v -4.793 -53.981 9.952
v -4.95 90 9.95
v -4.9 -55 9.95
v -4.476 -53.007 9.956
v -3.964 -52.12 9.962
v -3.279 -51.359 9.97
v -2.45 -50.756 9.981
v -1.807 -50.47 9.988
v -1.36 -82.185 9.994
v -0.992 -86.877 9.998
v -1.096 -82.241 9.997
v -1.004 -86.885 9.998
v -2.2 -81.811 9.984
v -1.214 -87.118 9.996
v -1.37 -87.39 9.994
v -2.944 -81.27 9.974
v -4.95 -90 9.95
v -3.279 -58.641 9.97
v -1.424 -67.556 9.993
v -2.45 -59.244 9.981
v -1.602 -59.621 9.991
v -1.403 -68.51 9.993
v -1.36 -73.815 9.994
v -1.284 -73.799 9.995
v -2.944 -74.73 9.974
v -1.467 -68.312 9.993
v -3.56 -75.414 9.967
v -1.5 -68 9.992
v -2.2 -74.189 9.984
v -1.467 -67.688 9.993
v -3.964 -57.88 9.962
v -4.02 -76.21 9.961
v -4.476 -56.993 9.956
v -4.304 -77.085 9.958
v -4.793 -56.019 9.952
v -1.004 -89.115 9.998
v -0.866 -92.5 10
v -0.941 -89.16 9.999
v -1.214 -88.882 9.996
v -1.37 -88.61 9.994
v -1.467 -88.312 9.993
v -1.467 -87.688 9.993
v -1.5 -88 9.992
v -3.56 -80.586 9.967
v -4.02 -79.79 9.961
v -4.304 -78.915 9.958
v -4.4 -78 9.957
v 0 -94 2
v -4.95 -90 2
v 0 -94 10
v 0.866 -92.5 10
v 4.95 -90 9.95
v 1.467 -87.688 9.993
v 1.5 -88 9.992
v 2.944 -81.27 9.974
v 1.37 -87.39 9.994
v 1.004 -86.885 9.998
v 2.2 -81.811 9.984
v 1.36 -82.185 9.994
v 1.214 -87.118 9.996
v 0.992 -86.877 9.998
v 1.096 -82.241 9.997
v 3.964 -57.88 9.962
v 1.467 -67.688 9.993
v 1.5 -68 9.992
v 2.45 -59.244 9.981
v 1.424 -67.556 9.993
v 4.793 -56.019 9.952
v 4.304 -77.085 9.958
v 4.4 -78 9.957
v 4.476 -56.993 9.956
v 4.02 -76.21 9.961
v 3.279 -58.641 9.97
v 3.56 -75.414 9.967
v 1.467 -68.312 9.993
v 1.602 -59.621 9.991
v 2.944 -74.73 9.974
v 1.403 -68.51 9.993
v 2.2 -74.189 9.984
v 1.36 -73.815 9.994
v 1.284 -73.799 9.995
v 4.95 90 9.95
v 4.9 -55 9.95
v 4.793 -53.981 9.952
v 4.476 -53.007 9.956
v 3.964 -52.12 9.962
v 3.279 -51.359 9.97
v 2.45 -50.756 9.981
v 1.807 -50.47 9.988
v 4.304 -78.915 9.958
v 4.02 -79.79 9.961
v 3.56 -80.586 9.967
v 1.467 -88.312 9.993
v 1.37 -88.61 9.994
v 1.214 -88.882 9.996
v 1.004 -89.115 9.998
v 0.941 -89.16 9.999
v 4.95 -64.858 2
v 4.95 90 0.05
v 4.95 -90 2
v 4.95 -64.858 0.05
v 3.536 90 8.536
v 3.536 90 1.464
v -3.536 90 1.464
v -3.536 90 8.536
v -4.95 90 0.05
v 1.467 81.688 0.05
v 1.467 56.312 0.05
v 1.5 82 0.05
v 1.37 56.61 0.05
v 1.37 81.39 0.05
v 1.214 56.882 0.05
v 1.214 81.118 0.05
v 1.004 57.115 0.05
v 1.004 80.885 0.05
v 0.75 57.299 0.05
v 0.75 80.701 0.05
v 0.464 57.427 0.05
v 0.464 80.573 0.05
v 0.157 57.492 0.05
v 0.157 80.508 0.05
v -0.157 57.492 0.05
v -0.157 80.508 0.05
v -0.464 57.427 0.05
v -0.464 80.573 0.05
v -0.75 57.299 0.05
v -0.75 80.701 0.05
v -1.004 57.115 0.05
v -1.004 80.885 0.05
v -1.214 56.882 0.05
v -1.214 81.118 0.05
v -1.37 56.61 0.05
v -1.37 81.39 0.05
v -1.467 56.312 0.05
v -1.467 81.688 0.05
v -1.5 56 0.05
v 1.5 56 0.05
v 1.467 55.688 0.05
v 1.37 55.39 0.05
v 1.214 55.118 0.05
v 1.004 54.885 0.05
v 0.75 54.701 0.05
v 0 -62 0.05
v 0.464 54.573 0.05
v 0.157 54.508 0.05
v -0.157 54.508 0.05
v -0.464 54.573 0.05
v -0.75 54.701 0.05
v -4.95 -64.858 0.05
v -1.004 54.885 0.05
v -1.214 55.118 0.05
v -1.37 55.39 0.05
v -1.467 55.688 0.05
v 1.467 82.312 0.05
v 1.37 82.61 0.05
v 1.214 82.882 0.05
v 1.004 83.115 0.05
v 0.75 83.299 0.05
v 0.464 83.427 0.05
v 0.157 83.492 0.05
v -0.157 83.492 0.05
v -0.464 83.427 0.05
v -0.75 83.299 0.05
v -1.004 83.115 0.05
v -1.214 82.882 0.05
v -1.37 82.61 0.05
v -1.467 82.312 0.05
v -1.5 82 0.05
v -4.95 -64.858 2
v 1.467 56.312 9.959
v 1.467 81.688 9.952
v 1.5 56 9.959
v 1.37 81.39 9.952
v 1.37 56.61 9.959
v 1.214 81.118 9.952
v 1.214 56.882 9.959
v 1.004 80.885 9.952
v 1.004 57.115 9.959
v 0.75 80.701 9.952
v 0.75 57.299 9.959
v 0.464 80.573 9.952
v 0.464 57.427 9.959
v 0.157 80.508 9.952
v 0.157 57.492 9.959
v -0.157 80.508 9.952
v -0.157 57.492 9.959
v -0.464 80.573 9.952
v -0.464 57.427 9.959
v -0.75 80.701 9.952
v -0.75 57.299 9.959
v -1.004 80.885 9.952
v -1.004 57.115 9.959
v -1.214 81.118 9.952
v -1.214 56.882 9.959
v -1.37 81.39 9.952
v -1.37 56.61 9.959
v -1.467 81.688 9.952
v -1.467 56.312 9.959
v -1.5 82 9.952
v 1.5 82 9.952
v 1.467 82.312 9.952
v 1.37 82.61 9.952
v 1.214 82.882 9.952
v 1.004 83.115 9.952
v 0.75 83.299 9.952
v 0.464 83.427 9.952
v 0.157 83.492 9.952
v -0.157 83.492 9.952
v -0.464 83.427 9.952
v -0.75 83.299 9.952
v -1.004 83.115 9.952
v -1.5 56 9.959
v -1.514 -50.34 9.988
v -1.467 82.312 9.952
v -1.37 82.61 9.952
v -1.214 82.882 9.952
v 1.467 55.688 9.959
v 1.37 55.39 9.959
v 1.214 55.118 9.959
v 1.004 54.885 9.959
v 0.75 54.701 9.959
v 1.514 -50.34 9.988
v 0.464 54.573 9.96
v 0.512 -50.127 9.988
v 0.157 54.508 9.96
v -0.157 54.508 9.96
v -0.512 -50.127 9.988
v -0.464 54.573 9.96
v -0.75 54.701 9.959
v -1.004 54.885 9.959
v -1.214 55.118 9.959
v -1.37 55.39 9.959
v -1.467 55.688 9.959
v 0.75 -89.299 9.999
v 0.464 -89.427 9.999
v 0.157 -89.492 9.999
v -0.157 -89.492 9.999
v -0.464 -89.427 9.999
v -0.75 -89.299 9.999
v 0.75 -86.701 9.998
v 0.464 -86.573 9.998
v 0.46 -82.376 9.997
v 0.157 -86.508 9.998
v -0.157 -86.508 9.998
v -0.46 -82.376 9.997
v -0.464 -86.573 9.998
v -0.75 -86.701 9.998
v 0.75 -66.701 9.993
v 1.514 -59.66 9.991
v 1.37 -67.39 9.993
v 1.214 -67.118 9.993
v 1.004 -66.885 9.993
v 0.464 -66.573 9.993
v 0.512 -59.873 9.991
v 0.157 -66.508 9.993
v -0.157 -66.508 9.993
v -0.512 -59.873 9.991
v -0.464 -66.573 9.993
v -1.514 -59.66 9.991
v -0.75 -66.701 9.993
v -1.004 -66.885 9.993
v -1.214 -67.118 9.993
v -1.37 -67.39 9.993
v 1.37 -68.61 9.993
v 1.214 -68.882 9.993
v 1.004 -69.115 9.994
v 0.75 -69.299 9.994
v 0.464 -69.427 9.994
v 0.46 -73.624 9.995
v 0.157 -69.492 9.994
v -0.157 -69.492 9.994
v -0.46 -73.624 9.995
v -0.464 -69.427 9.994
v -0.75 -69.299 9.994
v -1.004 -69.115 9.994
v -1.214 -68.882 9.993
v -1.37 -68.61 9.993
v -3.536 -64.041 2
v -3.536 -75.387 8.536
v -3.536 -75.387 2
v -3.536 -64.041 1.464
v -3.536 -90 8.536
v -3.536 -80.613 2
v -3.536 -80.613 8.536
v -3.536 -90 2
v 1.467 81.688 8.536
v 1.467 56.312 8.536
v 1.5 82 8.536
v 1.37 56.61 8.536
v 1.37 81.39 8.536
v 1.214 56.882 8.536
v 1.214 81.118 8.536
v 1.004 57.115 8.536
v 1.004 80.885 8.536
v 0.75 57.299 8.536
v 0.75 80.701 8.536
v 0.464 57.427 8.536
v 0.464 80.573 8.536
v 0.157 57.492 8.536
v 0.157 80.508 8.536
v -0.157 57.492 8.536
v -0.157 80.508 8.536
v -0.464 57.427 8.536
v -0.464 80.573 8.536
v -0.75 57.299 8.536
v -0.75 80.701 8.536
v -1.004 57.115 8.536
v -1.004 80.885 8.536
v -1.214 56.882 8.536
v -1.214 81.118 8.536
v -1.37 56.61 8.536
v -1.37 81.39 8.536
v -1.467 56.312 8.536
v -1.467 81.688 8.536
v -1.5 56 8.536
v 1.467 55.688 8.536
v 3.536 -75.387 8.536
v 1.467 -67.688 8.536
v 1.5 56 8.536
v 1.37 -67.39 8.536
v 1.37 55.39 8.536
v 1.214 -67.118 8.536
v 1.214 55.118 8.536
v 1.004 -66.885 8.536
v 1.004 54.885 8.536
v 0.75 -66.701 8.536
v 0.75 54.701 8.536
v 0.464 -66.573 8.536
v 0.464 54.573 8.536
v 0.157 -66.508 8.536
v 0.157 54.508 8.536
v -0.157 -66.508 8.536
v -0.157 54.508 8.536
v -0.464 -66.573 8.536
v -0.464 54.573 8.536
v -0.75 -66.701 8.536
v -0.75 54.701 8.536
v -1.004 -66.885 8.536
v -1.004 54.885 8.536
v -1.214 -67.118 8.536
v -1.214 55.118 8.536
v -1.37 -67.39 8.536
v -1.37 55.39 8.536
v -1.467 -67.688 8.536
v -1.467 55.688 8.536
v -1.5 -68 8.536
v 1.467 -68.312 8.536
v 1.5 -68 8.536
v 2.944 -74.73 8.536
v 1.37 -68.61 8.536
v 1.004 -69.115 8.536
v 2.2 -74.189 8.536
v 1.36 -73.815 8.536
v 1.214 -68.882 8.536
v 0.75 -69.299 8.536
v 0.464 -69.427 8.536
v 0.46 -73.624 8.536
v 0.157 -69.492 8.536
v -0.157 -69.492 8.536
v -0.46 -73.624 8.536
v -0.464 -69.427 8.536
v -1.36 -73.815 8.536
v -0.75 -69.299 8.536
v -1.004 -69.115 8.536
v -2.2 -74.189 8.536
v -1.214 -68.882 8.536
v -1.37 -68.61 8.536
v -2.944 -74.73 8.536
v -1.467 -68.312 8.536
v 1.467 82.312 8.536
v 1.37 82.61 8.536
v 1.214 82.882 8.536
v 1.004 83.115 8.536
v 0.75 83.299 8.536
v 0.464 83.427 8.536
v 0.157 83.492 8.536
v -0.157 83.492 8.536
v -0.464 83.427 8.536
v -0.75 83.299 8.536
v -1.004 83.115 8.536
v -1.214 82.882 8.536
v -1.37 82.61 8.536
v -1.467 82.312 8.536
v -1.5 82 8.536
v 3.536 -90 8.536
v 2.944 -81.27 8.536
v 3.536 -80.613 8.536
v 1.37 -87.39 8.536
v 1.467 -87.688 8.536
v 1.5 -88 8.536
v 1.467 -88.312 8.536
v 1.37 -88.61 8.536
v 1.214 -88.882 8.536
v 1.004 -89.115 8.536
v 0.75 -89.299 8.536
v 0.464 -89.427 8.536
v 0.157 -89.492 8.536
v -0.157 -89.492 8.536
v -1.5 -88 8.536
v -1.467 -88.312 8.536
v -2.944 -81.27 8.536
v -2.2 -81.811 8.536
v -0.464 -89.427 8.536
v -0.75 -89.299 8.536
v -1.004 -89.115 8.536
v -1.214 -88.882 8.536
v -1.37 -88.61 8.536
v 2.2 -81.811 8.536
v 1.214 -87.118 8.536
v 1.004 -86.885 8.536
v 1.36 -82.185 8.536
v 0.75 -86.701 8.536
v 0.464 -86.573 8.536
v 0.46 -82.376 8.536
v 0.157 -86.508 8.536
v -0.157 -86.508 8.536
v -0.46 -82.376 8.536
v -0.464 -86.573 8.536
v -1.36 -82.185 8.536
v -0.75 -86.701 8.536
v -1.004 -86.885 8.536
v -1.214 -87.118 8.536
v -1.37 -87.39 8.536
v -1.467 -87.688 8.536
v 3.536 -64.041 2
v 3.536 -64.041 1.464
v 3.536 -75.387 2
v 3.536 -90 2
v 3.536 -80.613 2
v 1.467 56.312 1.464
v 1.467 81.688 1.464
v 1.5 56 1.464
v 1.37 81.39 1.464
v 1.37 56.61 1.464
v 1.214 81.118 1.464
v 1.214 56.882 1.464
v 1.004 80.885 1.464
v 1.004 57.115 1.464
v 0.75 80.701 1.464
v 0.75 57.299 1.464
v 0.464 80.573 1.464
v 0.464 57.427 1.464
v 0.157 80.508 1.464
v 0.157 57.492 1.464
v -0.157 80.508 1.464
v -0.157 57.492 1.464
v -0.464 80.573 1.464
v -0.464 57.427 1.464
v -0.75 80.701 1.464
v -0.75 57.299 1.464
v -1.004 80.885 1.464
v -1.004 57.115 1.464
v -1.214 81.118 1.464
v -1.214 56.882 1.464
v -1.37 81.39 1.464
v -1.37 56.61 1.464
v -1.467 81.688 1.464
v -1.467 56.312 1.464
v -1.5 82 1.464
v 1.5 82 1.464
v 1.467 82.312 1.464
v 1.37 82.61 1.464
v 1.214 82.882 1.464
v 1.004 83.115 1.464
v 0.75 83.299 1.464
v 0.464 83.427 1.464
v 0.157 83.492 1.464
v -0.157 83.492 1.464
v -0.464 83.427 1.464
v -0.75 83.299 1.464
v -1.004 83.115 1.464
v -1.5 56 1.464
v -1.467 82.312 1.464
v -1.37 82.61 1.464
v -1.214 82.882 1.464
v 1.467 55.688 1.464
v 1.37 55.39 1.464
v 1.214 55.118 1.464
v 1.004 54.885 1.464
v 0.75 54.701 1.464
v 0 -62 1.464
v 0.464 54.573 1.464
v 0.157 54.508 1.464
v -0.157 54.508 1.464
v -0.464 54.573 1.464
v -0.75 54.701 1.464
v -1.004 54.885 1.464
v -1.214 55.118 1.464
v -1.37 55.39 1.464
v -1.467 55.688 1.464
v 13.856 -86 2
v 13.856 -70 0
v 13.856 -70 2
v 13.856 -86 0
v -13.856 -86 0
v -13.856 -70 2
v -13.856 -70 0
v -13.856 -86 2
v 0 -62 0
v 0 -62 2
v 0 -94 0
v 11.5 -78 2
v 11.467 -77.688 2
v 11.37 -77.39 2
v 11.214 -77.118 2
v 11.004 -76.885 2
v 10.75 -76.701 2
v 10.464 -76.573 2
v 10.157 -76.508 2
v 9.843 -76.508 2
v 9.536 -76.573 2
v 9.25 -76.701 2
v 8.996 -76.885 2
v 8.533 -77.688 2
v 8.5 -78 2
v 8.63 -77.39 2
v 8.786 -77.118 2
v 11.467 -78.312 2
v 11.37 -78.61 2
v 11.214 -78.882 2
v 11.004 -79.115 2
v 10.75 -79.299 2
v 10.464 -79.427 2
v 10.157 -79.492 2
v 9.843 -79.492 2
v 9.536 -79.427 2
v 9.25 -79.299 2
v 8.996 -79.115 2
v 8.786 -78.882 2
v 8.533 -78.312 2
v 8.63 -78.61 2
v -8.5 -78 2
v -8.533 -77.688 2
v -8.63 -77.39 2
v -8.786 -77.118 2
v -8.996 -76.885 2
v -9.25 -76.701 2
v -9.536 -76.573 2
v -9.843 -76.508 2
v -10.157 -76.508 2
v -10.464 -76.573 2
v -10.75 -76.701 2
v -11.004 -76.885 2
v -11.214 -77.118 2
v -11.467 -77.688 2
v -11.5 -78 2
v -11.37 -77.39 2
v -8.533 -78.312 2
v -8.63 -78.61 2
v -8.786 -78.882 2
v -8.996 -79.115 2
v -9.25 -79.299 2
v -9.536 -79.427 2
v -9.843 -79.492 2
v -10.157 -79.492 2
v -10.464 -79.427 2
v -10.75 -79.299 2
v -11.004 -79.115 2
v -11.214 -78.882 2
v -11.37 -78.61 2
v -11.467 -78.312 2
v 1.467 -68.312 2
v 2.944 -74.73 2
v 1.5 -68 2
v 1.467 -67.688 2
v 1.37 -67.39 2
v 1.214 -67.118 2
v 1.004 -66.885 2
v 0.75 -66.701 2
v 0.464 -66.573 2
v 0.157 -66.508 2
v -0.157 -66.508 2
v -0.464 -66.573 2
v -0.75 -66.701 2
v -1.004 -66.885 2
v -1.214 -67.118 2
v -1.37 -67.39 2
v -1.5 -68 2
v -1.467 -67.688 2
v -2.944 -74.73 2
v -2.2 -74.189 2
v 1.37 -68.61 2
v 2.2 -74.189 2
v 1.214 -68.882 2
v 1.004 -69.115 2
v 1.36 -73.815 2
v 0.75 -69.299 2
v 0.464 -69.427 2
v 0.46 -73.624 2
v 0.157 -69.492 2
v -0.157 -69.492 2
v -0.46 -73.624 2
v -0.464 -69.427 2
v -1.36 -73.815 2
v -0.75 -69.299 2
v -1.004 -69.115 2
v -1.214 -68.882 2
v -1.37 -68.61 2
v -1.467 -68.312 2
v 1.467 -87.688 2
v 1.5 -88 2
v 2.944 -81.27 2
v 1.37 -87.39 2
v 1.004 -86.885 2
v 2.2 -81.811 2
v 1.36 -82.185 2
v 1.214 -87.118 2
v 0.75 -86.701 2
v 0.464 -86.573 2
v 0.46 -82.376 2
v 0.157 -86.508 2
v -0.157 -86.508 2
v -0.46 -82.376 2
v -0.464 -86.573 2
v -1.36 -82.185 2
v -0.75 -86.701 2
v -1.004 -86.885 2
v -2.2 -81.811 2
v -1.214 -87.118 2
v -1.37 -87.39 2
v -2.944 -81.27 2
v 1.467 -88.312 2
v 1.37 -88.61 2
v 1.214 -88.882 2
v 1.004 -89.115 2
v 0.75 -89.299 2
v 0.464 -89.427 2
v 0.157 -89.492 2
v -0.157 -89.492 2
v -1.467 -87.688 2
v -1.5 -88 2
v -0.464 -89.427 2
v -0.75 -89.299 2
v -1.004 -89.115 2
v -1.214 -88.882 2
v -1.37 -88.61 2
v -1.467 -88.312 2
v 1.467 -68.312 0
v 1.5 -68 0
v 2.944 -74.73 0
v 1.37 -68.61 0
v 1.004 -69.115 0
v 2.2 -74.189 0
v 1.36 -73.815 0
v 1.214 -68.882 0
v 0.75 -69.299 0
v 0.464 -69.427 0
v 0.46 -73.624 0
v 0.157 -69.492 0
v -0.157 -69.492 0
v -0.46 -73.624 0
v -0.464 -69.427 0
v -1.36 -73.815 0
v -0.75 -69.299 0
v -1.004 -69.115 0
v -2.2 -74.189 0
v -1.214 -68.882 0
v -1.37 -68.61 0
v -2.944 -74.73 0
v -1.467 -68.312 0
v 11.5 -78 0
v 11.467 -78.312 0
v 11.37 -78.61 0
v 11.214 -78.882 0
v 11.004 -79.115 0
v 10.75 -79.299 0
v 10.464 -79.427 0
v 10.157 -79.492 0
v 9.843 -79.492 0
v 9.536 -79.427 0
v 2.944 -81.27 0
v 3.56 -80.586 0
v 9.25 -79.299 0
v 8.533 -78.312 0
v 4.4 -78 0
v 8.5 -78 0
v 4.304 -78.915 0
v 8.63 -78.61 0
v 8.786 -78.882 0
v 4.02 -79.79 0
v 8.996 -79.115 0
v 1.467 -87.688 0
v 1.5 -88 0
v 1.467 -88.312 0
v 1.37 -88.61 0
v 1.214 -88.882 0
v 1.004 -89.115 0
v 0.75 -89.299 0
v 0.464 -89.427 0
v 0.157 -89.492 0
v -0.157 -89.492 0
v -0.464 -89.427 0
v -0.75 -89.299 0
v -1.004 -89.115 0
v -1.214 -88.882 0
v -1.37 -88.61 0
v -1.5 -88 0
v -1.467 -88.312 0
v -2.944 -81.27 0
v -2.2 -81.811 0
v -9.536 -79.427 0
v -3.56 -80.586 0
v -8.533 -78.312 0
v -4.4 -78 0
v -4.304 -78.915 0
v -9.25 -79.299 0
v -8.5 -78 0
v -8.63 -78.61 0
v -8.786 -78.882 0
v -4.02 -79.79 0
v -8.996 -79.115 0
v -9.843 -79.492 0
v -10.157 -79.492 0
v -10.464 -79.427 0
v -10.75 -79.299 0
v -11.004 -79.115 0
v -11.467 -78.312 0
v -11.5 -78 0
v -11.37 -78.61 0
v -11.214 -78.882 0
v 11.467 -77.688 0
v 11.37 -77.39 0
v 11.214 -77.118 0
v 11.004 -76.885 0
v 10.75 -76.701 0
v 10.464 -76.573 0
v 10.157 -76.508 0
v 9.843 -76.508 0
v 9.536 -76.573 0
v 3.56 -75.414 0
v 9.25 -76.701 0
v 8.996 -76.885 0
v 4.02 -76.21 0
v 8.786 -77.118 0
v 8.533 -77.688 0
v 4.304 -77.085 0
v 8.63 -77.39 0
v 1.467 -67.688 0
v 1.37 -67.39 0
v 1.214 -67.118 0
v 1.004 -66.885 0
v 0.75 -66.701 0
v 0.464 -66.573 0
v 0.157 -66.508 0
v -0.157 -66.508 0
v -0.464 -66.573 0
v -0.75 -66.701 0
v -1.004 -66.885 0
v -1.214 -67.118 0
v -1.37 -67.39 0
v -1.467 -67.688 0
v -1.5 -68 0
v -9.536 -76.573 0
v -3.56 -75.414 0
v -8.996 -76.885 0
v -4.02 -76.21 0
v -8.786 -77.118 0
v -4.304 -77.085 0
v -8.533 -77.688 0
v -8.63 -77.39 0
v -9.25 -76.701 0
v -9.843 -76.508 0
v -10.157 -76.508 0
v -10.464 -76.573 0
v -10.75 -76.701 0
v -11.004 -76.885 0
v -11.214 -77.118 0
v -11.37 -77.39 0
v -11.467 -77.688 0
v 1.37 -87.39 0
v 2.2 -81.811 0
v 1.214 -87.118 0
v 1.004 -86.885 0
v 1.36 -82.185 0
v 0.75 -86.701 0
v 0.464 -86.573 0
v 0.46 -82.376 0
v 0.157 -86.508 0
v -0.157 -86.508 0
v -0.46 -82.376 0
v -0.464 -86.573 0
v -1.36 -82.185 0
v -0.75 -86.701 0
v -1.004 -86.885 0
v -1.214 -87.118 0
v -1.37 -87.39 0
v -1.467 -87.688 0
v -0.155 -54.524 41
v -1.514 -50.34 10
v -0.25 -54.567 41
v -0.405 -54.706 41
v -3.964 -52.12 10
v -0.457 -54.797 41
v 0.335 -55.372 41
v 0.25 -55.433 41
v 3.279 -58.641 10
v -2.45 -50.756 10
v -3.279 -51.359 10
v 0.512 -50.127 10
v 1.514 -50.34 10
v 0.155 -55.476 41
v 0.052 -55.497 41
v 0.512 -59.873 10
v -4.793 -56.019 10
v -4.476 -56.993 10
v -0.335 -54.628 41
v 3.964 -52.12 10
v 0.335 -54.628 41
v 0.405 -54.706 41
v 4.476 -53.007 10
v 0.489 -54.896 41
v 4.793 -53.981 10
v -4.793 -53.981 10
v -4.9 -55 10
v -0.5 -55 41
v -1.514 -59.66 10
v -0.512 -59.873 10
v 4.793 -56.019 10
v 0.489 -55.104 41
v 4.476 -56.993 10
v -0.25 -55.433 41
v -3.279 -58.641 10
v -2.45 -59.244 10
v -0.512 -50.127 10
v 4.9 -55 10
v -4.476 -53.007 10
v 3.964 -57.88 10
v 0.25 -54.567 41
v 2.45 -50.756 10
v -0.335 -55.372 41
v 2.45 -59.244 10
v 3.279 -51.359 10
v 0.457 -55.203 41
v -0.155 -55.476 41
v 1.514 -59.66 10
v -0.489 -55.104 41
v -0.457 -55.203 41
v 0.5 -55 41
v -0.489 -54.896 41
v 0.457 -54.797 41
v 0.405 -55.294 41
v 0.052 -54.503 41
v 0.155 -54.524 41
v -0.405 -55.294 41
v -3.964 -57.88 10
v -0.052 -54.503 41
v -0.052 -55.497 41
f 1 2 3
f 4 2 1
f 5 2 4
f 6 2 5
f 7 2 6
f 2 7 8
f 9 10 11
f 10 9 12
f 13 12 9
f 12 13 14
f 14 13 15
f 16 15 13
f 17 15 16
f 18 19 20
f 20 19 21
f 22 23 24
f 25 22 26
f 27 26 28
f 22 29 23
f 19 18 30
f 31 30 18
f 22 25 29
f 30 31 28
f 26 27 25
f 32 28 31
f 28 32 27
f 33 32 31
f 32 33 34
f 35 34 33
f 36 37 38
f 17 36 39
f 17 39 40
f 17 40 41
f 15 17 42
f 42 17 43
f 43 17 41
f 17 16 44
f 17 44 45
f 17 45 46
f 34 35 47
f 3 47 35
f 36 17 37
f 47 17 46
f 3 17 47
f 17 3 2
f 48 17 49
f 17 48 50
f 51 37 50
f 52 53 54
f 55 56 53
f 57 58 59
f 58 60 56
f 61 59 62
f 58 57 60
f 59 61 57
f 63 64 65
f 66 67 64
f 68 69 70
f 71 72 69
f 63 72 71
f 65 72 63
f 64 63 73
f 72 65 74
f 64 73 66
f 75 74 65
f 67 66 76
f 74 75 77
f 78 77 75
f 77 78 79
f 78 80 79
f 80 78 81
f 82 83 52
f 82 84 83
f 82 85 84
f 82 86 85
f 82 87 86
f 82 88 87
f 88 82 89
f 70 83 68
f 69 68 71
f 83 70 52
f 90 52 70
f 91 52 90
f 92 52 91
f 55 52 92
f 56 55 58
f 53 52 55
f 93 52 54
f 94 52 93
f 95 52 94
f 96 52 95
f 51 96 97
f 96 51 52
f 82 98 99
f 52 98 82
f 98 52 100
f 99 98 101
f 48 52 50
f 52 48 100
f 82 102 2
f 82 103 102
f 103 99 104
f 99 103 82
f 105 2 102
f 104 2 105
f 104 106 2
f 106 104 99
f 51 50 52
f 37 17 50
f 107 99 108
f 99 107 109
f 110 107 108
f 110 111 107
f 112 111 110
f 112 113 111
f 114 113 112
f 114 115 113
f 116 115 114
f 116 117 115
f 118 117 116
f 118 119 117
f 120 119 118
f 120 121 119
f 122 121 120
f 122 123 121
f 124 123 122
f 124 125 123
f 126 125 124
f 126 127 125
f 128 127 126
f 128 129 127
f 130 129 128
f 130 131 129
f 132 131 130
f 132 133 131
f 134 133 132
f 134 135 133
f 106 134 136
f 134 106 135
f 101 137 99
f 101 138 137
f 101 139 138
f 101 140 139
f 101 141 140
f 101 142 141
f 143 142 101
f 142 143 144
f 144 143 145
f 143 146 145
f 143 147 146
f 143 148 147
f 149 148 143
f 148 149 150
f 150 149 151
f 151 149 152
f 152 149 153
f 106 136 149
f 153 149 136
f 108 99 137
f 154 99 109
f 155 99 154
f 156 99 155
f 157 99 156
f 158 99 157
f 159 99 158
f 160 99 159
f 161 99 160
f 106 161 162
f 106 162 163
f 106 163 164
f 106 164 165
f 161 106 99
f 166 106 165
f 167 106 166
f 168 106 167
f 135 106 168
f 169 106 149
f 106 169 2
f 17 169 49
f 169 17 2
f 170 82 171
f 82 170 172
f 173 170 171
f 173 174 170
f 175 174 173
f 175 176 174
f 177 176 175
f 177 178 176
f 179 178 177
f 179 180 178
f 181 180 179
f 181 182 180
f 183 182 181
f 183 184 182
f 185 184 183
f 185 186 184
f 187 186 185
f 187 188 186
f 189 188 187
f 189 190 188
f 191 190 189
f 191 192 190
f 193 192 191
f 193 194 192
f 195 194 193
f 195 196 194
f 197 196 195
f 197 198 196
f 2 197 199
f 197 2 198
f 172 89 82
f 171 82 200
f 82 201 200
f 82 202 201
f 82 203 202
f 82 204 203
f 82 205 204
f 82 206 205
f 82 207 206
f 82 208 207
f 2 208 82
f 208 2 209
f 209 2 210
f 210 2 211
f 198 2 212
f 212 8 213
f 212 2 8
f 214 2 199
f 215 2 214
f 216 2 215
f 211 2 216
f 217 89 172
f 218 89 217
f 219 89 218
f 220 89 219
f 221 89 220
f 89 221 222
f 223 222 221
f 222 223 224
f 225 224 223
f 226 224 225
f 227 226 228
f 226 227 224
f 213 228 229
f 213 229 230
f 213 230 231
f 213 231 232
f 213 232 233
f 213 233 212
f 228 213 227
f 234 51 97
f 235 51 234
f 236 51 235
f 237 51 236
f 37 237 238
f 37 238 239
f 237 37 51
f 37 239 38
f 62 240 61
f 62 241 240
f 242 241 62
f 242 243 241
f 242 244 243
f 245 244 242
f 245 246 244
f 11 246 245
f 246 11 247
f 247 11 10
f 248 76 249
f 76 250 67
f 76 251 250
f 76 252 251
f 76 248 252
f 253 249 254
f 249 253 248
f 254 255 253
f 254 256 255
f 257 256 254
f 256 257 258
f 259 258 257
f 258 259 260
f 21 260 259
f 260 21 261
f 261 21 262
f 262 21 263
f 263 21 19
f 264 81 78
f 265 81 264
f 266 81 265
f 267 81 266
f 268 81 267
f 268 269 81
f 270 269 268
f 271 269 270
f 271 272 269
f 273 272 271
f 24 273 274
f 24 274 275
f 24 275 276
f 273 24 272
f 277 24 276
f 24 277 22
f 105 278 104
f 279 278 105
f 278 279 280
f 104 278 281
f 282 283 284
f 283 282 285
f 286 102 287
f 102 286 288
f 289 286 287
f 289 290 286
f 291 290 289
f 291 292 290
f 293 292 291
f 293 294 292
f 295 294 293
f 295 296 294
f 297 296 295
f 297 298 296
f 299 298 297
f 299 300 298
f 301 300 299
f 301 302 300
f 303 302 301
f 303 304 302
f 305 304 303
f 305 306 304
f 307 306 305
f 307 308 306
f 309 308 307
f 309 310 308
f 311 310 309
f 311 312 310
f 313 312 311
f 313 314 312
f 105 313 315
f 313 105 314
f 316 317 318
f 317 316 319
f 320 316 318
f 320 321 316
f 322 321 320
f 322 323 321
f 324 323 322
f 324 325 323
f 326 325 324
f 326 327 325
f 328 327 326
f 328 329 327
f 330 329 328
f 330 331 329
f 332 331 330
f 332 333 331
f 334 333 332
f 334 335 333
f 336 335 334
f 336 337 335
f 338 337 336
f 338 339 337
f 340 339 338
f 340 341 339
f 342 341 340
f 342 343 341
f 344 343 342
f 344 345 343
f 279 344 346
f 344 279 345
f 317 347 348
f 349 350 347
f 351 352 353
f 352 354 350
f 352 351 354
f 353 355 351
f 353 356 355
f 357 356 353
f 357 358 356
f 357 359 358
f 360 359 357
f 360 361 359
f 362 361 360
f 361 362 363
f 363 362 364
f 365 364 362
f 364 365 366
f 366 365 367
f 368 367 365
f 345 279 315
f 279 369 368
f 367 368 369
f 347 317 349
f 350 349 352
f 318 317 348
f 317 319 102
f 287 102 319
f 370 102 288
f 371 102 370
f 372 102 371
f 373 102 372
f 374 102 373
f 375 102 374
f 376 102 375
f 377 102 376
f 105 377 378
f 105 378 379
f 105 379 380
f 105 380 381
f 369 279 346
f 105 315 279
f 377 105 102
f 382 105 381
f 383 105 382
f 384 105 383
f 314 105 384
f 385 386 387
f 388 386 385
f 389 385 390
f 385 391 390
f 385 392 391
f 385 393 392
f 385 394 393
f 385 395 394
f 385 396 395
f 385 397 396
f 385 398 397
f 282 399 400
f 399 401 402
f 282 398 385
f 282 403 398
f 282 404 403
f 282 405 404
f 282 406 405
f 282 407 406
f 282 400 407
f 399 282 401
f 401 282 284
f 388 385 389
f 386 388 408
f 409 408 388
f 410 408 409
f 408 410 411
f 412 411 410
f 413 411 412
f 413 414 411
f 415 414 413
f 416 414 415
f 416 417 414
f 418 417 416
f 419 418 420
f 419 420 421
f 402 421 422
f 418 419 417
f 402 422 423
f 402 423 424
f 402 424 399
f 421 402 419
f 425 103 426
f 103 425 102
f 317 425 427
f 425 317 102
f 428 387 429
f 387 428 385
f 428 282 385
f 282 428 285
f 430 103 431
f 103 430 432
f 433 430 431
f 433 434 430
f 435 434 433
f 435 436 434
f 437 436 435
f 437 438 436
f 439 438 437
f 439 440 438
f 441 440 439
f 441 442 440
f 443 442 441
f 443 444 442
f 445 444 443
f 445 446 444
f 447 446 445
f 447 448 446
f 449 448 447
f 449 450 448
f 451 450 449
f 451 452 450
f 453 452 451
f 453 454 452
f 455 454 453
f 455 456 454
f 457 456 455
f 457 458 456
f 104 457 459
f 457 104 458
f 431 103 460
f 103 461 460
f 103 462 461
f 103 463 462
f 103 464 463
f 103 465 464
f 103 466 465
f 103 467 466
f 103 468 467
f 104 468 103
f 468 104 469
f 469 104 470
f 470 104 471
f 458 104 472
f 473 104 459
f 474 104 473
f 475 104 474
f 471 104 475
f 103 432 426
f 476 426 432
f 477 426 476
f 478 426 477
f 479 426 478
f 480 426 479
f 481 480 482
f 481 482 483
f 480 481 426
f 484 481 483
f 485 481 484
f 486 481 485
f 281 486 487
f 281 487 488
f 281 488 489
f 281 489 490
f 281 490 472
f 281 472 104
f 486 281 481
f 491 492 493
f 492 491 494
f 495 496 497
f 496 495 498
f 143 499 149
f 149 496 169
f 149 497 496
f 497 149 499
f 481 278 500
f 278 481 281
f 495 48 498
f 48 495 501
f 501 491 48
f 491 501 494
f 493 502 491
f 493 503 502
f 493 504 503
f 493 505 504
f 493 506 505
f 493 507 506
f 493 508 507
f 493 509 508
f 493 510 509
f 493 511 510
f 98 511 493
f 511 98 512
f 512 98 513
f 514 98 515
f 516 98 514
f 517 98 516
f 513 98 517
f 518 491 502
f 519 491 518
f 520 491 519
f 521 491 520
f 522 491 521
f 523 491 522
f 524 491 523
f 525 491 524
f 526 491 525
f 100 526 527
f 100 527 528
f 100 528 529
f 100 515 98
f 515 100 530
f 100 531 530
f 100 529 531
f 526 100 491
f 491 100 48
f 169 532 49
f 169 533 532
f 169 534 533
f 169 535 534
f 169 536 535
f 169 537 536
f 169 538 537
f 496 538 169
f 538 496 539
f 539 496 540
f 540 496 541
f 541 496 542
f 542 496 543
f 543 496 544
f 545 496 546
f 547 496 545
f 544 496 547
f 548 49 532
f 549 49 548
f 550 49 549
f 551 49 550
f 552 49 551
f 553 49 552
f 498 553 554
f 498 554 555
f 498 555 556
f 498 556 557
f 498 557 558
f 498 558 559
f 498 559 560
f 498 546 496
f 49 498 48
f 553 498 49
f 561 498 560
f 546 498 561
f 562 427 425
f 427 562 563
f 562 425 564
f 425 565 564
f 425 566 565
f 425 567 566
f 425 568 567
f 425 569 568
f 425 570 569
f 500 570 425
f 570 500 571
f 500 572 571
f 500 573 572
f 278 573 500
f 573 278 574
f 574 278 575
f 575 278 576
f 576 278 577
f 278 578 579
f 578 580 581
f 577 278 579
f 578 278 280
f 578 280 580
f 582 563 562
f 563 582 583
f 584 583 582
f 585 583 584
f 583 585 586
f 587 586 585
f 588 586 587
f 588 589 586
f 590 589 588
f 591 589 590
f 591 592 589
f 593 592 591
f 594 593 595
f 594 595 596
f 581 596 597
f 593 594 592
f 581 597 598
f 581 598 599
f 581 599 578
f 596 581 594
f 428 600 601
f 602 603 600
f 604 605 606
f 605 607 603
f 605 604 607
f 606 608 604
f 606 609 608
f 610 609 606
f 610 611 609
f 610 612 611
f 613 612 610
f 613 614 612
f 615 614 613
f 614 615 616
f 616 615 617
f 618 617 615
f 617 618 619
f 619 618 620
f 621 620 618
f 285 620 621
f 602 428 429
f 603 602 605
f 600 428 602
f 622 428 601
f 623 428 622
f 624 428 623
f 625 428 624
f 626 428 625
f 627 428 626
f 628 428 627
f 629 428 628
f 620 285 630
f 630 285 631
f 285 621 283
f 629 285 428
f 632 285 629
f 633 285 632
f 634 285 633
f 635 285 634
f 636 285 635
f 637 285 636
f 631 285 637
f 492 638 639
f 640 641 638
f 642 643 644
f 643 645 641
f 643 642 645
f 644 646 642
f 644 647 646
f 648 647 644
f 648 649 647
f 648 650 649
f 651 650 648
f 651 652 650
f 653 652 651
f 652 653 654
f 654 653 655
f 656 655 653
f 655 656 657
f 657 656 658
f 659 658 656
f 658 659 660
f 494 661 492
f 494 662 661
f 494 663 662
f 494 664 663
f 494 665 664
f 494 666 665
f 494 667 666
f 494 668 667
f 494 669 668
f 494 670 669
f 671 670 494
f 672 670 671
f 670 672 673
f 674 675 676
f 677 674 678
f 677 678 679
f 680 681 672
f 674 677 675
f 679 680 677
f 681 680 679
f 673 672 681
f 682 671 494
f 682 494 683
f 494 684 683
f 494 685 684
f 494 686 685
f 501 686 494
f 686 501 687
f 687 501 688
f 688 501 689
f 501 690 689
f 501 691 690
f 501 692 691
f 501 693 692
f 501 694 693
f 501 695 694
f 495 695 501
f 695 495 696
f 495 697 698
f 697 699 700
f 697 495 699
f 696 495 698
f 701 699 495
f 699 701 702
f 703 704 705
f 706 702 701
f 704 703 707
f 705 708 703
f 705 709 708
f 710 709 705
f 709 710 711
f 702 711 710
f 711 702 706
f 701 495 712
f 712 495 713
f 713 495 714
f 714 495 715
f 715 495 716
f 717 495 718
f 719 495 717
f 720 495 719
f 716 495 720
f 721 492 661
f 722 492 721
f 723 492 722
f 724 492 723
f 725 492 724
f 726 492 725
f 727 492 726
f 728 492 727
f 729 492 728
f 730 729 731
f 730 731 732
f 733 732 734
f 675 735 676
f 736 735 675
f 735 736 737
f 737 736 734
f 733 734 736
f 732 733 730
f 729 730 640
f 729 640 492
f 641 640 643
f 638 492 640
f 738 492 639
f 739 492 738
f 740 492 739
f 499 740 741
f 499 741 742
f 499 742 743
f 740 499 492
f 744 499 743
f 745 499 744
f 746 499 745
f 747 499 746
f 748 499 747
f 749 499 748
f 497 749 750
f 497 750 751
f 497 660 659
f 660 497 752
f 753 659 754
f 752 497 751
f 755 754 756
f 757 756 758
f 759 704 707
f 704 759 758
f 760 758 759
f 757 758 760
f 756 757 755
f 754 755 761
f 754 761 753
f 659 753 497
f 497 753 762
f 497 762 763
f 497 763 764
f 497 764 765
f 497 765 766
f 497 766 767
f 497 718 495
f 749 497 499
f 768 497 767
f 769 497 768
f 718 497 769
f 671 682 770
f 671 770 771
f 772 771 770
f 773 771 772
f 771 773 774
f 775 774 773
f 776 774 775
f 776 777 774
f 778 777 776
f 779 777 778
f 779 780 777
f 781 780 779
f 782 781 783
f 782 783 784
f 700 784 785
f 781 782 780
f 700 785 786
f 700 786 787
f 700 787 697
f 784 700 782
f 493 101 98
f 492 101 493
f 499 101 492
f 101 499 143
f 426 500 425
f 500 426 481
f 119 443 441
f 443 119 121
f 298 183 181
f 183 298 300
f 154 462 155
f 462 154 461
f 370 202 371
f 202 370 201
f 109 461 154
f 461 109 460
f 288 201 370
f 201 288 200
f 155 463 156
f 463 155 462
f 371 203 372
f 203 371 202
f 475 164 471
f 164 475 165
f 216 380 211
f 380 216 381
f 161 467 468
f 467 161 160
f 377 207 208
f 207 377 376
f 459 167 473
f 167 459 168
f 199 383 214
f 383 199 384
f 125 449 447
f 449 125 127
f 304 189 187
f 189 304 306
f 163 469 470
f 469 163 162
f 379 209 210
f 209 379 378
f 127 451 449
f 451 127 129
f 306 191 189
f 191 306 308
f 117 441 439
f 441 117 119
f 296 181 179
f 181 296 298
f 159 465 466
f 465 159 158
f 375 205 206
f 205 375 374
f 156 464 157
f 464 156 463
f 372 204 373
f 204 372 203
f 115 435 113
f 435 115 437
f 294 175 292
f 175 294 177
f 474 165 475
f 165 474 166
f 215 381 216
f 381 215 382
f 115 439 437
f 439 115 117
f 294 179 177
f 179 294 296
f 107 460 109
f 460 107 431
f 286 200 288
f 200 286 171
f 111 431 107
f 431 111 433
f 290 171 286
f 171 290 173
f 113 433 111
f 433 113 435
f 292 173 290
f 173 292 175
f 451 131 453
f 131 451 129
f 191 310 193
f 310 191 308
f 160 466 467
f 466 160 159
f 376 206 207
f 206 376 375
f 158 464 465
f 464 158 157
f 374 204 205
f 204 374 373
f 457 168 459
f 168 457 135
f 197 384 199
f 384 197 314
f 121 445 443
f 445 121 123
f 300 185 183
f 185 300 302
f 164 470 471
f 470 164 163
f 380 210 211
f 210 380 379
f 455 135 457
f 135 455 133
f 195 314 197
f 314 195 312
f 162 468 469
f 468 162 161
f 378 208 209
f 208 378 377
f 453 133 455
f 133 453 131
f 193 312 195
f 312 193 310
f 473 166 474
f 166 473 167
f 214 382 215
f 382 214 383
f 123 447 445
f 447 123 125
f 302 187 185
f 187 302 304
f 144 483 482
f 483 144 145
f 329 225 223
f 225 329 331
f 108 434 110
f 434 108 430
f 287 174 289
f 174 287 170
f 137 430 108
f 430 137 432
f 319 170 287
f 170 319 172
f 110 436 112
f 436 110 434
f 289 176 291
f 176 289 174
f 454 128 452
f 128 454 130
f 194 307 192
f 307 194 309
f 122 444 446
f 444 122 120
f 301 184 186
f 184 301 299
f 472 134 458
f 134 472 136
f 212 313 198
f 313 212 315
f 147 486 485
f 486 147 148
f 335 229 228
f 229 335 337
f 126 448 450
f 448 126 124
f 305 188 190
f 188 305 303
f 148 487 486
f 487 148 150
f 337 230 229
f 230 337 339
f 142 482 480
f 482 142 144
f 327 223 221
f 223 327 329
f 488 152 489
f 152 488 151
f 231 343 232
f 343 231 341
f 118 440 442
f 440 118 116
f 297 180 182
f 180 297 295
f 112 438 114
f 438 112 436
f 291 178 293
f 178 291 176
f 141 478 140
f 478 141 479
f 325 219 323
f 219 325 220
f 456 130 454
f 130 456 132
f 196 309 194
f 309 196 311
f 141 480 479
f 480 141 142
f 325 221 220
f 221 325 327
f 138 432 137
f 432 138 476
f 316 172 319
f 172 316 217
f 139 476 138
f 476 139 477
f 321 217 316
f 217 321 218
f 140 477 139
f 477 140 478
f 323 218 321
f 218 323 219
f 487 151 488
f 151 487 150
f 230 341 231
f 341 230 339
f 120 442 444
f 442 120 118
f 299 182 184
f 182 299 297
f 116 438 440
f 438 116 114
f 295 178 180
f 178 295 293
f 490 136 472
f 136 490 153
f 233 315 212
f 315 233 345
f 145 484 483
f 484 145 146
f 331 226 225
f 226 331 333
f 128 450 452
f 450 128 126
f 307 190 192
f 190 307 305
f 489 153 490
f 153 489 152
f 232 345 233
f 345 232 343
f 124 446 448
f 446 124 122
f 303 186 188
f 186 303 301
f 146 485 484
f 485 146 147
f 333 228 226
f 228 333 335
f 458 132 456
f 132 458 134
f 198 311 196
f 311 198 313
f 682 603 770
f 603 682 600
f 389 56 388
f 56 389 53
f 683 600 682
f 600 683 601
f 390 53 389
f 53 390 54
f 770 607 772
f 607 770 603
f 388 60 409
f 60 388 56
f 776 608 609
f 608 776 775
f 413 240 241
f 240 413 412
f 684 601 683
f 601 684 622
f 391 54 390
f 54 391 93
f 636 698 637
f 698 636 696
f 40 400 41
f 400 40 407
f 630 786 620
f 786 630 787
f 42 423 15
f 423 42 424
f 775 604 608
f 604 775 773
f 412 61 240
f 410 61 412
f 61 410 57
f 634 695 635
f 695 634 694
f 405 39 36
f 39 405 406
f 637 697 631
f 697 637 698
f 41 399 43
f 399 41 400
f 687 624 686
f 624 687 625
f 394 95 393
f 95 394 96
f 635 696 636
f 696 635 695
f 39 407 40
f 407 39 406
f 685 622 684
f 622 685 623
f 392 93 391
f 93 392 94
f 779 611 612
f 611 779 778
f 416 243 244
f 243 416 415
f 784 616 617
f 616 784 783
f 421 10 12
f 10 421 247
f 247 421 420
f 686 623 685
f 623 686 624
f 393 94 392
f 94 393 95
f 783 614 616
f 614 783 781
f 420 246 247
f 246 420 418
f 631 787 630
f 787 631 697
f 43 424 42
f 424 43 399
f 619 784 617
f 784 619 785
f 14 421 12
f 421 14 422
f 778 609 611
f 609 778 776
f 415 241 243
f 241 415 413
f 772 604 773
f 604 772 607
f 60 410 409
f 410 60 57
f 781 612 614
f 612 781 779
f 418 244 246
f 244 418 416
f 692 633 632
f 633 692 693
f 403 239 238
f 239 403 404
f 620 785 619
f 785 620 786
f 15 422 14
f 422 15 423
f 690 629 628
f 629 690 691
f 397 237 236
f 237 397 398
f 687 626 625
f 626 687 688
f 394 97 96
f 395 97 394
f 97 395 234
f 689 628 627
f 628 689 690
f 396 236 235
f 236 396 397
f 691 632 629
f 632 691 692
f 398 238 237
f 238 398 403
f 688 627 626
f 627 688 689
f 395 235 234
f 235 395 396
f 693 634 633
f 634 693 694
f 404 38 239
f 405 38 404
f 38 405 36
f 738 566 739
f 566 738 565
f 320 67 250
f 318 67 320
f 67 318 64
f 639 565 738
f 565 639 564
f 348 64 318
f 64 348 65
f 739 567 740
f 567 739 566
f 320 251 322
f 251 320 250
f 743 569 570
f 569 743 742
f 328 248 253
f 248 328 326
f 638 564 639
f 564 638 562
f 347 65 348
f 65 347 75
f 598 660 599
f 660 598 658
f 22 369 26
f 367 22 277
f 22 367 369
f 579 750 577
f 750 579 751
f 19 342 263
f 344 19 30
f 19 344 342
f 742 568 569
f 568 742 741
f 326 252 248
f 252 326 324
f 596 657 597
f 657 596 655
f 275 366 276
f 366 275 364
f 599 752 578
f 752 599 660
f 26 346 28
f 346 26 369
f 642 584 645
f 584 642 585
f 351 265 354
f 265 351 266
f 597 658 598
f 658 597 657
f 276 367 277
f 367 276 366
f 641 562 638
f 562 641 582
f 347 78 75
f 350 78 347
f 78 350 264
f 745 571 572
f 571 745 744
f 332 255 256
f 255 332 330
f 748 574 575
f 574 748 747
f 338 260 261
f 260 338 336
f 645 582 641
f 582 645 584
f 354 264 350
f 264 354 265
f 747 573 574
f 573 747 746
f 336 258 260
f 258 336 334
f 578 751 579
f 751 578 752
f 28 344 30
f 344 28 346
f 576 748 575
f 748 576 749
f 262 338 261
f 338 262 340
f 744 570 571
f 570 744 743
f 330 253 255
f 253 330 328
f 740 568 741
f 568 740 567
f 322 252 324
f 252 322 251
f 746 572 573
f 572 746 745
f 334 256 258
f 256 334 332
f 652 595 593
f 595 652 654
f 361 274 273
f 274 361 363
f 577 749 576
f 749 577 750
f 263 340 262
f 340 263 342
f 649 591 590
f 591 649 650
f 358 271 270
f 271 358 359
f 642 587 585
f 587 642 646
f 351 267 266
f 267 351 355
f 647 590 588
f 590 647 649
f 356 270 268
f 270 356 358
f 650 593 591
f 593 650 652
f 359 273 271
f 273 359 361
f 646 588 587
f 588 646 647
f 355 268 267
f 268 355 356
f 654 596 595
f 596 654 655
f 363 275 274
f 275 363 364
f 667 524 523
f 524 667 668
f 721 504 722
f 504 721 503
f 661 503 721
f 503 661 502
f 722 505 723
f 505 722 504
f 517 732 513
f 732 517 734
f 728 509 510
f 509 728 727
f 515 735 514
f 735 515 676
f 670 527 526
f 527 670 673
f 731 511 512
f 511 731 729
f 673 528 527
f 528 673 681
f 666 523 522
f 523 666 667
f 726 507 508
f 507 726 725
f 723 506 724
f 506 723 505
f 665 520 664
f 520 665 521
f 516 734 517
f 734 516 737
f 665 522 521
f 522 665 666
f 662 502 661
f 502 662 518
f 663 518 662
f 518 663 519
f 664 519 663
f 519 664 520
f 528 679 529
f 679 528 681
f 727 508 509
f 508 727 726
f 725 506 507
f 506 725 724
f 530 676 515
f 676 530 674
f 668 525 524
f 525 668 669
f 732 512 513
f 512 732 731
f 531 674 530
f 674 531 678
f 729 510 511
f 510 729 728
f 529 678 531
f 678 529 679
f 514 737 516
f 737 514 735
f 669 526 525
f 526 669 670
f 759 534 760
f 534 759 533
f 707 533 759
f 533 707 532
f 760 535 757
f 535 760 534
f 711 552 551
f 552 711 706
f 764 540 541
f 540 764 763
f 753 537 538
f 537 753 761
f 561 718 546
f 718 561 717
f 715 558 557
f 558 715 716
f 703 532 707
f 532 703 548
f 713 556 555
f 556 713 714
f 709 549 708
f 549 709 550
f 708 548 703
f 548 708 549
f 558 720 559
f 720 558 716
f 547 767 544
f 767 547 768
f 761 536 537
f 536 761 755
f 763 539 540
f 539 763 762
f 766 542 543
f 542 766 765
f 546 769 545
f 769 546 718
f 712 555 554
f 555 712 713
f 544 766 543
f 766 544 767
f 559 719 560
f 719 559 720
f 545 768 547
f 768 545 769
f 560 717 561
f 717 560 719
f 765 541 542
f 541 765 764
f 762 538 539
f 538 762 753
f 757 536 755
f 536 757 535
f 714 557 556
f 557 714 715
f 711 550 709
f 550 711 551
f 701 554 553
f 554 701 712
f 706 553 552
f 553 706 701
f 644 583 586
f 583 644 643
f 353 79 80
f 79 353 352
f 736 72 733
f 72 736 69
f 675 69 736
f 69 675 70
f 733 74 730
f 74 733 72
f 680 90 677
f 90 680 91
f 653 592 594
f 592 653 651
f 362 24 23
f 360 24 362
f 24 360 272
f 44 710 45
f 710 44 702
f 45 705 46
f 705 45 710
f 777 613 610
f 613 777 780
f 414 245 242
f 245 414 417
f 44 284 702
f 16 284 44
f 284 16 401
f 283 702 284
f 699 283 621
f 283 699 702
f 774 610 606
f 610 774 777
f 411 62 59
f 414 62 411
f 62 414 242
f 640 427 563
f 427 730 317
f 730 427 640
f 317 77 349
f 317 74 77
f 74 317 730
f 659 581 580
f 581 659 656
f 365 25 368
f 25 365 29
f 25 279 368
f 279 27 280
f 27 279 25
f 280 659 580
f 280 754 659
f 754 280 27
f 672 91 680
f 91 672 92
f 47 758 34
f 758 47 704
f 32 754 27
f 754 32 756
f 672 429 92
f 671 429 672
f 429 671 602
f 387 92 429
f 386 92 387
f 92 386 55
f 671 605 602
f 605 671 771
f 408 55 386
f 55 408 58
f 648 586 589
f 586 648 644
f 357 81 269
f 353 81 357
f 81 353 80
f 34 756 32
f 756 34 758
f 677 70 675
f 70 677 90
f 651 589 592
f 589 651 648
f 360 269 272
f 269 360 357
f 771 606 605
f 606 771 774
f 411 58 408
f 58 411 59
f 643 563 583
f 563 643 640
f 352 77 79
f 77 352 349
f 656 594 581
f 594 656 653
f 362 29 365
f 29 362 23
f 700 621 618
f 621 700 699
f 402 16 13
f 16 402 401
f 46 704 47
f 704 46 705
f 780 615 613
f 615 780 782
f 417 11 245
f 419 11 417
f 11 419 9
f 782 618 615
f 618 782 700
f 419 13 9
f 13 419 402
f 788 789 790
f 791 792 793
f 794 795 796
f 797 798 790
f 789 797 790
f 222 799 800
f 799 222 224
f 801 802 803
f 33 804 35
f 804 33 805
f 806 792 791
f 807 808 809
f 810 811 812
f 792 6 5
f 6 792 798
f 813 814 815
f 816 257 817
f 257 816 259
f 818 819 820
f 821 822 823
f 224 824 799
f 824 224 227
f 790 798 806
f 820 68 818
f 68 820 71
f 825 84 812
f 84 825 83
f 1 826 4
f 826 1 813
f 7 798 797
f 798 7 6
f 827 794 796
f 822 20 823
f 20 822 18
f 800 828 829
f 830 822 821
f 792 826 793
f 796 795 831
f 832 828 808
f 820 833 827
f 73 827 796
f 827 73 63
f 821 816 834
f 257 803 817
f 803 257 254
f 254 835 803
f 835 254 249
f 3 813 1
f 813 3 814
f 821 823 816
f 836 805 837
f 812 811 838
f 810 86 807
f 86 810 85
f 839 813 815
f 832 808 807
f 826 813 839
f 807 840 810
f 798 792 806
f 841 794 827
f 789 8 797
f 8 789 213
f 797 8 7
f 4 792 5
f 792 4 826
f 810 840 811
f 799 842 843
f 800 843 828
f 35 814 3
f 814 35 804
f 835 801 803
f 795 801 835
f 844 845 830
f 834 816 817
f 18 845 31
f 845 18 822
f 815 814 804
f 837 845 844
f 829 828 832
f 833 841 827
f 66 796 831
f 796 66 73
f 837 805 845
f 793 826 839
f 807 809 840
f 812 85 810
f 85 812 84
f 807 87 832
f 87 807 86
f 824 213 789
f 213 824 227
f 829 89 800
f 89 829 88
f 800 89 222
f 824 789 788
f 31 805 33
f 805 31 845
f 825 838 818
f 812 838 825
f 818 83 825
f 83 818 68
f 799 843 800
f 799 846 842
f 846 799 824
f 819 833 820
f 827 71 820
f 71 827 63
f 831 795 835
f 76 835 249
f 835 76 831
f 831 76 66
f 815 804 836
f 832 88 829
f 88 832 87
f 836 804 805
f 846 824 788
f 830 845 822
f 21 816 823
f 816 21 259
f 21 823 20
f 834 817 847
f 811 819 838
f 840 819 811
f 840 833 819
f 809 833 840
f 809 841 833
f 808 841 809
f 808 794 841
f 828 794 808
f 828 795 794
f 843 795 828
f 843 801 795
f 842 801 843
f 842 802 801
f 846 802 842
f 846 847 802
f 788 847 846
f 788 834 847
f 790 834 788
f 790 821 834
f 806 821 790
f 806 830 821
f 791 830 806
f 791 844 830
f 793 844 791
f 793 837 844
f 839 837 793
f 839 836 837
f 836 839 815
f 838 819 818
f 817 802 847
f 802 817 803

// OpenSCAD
module tubo(h, d, fn, hull1, hull2, hull3){
    difference(){
        hull(){
            translate([0,90,5])
            rotate([90,-45,0])
            cylinder (h = h, d=d, $fn=fn);
          
        
            translate([0,-93,2])
            rotate([0,0,30])
            cylinder (h = hull1, d=hull2, $fn=hull3);
        }
      
        translate([0,90,5])
        rotate([90,-45,0])
        cylinder (h = h, d=d-4, $fn=fn);
    }
}

module helice(h, d, fn, hc, dc, fnc, hcc, dcc, fncc, hh, dh, hull1, hull2, hull3){
    difference(){
        union(){
            translate([0,-78,0])
            rotate([0,0,90])
            cylinder (h = hc, d=dc, $fn=fnc);
            tubo(h, d, fn, hull1, hull2, hull3);
        }
        translate([0,82,0])
        cylinder (h = hcc, d=dcc, $fn=fncc);
        translate([0,56,0])
        cylinder (h = hcc, d=dcc, $fn=fncc);
        
        translate([0,-88,0])//hélice
        cylinder (h = hcc, d=dcc, $fn=fncc);
        translate([0,-68,0])
        cylinder (h = hcc, d=dcc, $fn=fncc);
        translate([10,-78,0])
        cylinder (h = hcc, d=dcc, $fn=fncc);
        translate([-10,-78,0])
        cylinder (h = hcc, d=dcc, $fn=fncc);
        
        translate([0,-78,0])
        cylinder (h = hcc*2, d=dcc+5.8, $fn=fncc);
}
hull(){
    translate([0,-55,9])
    cylinder (h = hh, d=dh, $fn=fncc);
    translate([0,-55,11])
    cylinder (h = hh+29, d=1, $fn=fncc);
}
}

helice(180,14,4, 2,32,6, 10,3,30, 1, 9.8, 8, 2, 3);
